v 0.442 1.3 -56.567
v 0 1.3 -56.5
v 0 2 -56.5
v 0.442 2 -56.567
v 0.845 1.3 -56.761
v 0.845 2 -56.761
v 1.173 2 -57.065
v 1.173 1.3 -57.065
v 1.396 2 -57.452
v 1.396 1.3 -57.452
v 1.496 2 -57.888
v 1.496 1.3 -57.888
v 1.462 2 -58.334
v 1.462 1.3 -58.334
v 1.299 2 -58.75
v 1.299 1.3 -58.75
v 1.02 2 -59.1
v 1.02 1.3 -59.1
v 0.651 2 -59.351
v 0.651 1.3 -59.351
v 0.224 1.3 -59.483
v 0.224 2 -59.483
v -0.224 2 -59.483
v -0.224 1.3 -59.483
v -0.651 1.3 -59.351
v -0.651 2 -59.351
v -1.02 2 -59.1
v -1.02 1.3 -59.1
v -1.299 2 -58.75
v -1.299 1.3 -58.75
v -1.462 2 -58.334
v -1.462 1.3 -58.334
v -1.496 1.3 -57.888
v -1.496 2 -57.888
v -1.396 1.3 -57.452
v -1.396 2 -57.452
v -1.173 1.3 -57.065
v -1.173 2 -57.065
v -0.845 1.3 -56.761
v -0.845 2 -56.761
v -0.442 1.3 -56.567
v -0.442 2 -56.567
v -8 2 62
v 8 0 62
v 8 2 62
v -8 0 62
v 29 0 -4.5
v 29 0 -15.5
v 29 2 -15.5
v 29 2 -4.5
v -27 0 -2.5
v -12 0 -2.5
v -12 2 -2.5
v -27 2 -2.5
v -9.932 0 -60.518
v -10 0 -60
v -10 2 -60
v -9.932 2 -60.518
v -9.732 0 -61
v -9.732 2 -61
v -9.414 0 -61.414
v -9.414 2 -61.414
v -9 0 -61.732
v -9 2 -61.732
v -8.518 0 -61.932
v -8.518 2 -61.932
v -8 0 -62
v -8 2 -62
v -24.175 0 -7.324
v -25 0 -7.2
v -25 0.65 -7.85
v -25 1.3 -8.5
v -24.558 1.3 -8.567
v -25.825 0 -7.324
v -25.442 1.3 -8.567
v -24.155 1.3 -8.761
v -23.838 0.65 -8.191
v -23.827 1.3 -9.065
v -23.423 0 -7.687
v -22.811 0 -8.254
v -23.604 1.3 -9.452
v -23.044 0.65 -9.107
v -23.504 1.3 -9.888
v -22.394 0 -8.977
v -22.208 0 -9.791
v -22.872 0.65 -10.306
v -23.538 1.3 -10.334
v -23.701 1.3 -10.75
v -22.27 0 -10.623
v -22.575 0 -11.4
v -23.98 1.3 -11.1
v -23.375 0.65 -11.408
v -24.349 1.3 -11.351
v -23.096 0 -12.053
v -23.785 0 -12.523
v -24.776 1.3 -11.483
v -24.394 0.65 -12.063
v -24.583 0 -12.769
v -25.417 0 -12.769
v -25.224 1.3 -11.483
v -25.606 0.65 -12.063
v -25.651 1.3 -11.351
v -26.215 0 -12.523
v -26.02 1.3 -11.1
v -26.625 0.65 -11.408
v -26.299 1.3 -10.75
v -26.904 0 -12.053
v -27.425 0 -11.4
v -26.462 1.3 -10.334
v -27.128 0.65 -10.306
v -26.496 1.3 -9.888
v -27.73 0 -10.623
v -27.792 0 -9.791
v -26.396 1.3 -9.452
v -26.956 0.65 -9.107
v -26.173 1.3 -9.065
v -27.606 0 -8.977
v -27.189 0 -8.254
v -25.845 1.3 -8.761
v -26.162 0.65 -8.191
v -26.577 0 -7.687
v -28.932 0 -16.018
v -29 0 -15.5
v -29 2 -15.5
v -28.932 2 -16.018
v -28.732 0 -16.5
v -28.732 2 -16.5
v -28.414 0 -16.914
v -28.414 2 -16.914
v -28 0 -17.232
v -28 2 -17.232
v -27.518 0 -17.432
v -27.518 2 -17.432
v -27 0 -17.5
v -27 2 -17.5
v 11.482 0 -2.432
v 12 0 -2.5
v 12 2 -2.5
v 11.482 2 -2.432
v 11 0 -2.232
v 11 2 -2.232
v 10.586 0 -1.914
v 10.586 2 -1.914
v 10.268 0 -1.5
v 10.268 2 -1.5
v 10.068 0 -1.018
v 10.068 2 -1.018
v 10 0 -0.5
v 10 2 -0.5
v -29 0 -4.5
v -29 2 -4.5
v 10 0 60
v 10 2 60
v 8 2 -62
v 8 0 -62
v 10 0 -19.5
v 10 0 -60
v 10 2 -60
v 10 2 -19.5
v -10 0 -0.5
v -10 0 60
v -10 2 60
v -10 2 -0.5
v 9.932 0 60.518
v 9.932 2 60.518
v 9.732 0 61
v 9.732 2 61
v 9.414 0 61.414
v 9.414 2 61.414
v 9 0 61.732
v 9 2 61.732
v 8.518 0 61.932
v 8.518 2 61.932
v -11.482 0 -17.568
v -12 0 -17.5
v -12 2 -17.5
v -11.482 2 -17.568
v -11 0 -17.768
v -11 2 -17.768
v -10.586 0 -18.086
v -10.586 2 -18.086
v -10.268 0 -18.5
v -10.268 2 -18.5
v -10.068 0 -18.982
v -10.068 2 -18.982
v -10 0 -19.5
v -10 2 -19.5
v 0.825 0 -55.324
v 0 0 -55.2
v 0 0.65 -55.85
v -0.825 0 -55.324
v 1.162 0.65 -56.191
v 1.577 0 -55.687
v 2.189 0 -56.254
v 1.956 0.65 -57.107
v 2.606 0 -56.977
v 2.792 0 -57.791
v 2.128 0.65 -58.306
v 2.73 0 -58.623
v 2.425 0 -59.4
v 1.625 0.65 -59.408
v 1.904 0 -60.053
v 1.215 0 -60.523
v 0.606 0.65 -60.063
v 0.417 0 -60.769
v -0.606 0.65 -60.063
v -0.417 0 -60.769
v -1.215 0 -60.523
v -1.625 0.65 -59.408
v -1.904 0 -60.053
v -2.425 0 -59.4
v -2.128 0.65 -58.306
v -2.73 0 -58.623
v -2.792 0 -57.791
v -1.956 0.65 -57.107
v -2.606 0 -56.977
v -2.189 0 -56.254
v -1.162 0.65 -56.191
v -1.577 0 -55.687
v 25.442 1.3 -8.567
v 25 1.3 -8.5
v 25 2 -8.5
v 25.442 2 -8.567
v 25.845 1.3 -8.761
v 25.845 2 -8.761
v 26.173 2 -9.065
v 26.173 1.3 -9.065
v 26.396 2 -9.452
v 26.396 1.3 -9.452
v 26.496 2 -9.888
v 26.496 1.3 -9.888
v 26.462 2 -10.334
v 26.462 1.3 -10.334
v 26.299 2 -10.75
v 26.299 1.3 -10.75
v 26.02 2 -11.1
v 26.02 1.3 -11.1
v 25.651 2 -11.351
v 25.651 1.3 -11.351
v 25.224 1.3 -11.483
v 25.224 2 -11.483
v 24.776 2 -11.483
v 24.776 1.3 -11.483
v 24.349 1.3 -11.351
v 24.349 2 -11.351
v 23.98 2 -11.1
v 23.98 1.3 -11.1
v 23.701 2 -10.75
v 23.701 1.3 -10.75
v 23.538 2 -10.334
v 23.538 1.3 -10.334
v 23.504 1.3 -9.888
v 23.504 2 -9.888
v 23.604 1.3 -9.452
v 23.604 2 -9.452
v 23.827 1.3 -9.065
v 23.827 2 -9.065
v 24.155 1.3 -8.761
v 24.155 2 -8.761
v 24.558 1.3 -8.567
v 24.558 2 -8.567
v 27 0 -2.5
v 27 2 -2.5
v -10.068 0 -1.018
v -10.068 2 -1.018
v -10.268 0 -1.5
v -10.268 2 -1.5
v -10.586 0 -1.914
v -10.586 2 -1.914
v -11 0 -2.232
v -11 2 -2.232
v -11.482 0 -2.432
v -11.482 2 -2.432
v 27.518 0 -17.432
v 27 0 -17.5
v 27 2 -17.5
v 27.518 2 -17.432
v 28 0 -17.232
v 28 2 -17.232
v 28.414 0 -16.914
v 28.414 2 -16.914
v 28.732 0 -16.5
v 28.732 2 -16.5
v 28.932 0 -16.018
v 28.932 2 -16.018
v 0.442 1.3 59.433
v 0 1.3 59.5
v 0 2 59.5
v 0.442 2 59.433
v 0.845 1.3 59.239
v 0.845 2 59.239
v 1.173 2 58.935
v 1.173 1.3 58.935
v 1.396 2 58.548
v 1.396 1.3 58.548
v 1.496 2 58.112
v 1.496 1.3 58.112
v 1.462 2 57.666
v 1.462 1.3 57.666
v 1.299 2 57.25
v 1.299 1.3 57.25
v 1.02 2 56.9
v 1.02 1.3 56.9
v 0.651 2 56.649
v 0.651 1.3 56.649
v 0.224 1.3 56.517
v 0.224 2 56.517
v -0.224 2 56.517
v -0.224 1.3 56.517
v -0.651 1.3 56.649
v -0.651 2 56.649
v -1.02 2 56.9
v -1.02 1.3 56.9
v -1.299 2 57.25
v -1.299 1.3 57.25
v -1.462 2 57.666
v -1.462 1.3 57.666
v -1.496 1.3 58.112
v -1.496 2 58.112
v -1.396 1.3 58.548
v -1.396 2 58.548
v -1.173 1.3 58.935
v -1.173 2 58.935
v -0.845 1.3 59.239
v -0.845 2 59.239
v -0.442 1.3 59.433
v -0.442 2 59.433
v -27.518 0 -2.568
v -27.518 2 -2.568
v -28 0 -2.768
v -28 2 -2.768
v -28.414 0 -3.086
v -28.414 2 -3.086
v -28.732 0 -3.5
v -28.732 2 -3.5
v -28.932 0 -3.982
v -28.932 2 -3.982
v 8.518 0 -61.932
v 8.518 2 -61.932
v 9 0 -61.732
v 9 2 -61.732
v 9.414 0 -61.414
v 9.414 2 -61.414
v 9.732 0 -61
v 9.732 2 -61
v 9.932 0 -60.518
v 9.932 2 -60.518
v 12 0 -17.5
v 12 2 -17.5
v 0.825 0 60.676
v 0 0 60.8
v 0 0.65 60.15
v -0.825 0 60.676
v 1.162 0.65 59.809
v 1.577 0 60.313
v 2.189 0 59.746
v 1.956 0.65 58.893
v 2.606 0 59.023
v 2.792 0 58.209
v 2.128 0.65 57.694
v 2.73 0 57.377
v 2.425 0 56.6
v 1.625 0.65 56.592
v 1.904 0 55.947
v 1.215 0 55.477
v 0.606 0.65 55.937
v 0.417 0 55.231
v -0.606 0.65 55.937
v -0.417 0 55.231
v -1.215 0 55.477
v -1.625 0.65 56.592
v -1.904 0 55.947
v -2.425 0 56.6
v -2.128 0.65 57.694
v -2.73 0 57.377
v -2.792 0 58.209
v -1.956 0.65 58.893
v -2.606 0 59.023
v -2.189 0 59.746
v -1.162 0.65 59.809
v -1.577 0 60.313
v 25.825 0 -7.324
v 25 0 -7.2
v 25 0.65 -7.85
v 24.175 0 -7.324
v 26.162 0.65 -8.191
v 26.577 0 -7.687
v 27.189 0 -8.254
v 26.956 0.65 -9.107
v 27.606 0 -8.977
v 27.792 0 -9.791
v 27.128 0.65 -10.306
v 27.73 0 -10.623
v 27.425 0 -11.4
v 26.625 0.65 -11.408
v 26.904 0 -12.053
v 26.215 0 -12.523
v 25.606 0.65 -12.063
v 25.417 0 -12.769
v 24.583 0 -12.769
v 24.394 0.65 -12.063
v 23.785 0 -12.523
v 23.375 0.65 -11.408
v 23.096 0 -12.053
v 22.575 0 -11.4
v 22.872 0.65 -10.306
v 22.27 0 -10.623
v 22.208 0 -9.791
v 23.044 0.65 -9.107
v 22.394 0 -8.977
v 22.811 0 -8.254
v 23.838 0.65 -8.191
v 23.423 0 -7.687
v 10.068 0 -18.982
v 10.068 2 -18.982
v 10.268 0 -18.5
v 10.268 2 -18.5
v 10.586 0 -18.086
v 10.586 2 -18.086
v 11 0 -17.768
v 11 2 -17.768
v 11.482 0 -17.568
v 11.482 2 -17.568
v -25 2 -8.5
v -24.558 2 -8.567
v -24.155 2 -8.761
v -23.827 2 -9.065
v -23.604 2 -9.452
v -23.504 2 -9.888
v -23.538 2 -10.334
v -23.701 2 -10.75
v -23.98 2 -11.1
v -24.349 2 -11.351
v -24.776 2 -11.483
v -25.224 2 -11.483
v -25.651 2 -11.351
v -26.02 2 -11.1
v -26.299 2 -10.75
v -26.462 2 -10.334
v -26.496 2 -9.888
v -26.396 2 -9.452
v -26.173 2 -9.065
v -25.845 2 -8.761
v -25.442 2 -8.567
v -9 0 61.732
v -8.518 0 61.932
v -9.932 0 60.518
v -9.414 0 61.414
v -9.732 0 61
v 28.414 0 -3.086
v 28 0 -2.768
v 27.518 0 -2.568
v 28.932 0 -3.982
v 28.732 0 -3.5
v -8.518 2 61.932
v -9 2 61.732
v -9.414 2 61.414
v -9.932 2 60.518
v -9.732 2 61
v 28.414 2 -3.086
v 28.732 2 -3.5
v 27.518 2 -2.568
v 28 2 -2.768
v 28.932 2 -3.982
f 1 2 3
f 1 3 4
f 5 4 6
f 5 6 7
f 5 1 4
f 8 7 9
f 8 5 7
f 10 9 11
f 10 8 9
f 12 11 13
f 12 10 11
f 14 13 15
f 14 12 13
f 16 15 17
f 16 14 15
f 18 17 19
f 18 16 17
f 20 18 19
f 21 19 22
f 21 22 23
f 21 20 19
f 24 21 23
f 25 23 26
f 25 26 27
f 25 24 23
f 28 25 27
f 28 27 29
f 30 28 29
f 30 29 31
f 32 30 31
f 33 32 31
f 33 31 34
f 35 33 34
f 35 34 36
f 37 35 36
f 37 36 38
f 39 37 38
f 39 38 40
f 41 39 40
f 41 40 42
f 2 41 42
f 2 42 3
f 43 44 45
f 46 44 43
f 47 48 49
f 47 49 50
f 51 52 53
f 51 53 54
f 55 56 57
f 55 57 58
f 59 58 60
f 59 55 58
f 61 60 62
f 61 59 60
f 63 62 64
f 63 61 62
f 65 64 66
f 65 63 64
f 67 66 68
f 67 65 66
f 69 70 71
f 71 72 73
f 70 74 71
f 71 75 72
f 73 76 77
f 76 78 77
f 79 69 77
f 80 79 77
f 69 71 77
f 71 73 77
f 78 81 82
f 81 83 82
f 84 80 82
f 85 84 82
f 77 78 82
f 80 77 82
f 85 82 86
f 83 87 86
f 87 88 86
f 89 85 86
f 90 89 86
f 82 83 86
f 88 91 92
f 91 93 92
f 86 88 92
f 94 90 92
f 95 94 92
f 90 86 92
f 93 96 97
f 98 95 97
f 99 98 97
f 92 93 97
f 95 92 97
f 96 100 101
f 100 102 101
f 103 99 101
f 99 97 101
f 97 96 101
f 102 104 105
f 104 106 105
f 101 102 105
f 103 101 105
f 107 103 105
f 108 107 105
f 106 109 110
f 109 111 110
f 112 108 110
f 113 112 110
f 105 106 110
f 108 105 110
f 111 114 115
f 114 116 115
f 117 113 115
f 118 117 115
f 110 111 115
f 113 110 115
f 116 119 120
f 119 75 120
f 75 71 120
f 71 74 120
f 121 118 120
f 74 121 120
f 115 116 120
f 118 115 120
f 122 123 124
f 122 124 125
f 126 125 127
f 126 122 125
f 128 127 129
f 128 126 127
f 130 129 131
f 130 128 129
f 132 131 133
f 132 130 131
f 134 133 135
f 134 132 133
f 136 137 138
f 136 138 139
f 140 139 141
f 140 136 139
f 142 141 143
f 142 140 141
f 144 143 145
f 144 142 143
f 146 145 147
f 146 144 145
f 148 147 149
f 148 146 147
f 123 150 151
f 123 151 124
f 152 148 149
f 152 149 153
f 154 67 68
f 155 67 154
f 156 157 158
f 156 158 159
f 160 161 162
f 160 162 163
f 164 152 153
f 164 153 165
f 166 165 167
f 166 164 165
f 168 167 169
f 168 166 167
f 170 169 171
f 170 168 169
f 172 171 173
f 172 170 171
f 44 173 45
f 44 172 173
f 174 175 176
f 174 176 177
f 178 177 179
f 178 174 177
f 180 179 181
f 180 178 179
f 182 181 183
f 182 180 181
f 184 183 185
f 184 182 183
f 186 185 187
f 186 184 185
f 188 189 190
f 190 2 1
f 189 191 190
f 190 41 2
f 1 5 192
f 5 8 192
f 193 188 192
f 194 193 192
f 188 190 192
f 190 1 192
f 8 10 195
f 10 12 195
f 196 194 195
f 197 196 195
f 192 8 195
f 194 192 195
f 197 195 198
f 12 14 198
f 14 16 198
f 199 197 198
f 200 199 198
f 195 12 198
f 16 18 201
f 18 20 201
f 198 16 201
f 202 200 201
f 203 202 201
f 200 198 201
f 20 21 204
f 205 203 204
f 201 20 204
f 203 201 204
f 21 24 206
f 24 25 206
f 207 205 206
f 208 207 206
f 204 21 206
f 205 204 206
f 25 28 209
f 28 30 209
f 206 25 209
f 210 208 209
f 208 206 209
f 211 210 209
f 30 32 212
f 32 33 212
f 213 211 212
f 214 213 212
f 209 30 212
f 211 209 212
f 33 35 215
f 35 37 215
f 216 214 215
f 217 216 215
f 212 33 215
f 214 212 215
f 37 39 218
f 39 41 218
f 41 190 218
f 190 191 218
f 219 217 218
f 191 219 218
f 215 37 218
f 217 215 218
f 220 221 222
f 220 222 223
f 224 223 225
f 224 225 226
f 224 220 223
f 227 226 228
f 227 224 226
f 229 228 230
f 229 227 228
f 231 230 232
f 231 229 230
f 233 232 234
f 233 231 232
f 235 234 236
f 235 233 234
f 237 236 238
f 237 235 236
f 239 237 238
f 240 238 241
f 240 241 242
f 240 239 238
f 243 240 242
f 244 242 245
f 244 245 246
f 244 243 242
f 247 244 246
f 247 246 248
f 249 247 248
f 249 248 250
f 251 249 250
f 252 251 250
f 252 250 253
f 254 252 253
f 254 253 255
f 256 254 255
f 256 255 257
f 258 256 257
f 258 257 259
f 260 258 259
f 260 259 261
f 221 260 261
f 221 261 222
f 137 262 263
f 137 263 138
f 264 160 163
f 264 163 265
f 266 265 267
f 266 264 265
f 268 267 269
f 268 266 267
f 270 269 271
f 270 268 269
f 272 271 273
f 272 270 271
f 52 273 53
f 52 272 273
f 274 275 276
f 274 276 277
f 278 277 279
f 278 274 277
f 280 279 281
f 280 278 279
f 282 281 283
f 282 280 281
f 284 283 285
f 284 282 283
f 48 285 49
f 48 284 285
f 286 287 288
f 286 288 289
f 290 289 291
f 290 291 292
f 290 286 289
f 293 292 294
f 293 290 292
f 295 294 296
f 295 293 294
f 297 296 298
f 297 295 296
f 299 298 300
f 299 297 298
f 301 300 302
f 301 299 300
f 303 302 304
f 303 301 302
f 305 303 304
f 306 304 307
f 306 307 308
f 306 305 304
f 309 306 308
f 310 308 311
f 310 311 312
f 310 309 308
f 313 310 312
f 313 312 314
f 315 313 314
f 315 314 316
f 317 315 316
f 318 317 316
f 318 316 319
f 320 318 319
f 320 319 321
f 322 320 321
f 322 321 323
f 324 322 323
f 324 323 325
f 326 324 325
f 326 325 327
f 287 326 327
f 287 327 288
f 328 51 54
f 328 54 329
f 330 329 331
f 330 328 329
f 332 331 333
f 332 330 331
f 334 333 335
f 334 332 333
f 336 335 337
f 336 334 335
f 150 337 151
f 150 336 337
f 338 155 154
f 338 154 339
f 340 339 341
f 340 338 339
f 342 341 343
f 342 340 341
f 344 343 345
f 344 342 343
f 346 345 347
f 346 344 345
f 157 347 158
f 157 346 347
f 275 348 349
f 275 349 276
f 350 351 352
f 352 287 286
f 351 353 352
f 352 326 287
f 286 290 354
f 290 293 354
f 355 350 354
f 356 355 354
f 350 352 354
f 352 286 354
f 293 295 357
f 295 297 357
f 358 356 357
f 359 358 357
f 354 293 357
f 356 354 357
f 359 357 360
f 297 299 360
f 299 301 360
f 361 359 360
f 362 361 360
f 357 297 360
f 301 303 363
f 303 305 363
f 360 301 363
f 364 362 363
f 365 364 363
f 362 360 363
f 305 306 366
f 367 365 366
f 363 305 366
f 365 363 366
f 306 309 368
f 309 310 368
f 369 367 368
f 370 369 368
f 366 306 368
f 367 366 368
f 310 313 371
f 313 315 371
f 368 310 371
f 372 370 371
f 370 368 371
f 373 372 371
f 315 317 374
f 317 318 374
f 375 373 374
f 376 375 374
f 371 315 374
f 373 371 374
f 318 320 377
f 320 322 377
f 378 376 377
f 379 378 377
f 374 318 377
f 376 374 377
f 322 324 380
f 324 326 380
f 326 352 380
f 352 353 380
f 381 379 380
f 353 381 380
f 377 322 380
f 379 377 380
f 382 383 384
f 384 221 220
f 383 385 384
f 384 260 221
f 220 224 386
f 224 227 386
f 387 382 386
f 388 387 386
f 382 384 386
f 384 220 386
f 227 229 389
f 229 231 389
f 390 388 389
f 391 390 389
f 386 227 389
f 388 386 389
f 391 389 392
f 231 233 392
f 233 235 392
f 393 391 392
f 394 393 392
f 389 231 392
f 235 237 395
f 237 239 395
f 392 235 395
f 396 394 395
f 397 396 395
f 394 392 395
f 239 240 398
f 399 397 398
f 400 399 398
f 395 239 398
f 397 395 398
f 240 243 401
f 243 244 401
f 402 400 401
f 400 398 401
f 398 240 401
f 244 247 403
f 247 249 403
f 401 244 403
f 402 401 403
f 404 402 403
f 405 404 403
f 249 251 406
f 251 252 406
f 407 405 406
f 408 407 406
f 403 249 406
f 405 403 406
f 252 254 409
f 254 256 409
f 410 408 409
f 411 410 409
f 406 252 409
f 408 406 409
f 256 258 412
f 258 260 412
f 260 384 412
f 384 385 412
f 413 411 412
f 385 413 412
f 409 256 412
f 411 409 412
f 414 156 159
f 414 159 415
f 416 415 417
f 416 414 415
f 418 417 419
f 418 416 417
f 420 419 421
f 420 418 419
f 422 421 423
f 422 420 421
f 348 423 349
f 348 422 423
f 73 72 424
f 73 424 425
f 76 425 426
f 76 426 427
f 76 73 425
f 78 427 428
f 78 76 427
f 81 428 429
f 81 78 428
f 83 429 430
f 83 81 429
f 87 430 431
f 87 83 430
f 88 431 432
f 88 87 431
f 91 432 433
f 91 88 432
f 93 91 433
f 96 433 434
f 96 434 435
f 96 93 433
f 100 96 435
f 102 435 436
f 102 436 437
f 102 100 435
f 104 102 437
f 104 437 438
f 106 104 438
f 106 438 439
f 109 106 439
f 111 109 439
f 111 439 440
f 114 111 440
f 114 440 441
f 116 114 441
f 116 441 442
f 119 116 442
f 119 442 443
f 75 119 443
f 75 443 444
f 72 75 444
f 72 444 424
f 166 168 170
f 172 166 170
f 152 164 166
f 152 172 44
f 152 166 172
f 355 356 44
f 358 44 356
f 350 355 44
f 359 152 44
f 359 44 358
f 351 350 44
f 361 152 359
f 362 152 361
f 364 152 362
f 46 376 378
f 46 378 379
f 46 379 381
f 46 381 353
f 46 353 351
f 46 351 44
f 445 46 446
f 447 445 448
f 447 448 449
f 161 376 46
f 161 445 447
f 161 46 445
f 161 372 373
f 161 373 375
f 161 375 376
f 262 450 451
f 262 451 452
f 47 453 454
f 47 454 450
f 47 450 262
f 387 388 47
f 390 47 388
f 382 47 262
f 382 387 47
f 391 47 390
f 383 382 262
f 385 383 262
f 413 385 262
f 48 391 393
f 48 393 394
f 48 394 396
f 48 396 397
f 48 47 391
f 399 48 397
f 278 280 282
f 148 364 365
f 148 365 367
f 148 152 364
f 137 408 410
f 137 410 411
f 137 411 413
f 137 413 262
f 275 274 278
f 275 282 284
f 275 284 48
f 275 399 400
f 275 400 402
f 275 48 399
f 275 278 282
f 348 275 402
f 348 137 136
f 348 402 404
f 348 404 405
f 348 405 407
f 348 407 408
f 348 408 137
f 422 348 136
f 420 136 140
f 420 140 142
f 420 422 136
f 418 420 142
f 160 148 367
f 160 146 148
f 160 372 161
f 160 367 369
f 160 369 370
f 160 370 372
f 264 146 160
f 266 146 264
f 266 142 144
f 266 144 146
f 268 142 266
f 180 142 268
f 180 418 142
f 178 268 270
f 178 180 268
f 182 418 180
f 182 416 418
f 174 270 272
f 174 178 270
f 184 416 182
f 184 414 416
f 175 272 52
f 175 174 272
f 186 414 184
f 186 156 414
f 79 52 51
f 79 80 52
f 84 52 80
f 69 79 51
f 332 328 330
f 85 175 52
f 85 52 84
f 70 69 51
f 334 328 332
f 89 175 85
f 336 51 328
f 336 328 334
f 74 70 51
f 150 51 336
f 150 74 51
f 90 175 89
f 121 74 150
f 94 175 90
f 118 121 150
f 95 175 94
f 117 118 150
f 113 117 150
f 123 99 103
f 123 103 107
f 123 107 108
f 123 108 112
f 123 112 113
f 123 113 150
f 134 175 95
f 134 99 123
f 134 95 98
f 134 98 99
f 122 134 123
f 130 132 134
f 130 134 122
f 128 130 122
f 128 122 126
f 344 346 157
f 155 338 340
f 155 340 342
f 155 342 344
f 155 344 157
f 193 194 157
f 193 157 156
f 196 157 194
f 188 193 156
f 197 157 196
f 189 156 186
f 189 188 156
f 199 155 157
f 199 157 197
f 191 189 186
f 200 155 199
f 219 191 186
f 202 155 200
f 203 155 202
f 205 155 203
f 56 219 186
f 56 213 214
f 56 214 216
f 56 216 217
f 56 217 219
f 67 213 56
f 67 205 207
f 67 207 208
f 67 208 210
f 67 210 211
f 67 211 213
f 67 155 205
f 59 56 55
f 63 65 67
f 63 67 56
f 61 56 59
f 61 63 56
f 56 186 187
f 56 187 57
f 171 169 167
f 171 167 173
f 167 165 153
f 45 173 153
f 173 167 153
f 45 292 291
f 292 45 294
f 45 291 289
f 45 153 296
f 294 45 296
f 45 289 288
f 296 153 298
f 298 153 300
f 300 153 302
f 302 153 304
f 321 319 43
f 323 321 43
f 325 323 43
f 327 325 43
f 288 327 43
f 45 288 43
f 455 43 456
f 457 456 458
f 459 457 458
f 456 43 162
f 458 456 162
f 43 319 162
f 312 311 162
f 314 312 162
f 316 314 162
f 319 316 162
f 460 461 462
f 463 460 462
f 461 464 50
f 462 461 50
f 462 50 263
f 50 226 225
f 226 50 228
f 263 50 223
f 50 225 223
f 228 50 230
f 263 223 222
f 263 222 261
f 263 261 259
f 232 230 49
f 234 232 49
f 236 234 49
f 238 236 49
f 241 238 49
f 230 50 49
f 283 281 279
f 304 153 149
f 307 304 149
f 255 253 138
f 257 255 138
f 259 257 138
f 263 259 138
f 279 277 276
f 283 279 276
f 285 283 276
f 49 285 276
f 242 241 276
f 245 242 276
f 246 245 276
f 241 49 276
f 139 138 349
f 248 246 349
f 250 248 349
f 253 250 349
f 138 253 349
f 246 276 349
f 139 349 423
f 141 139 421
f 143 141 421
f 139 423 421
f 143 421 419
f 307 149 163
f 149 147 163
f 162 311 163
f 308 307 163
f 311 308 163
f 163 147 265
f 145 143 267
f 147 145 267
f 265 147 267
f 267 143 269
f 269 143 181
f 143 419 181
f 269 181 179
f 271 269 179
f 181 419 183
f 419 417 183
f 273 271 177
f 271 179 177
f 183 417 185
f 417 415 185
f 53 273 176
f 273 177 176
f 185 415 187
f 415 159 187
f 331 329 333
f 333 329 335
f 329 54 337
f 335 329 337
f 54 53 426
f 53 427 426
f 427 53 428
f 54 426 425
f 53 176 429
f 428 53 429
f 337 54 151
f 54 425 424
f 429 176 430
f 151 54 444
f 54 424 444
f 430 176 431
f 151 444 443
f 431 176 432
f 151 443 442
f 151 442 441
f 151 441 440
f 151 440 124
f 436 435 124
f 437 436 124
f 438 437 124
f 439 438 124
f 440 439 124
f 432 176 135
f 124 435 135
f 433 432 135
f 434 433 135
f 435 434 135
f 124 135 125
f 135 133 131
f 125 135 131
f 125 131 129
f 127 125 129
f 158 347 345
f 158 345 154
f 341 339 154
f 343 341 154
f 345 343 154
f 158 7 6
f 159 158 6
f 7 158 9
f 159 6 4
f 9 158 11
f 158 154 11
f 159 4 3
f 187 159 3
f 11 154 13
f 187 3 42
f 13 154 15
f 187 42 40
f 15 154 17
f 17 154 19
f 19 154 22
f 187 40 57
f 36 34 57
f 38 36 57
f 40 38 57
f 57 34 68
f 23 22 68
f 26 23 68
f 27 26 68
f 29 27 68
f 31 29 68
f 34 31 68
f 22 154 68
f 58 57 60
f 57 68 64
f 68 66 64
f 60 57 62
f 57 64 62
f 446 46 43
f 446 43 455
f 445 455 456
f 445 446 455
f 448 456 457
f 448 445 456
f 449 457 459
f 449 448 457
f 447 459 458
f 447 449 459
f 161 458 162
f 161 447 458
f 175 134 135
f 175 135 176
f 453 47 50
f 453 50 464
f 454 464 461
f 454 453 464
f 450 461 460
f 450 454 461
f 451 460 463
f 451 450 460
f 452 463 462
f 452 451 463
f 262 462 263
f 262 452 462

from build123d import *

# Parameters (mm, degrees)
SKETCH1_R                     = 1.5
BOSS_EXTRUDE1_DEPTH           = 2
CSK_FOR_M3_SFHCS1_D           = 3
CSK_FOR_M3_SFHCS1_DEPTH       = 9.5
CSK_FOR_M3_SFHCS1_CSINK_D     = 5.6
CSK_FOR_M3_SFHCS1_CSINK_ANGLE = 90
CSK_FOR_M3_SFHCS1_TIP         = 0.901290929


with BuildPart() as part:
    # Sketch1 → Boss-Extrude1 (new body)
    with BuildSketch(Plane(origin=(0, 0, 0), x_dir=(1, 0, 0), z_dir=(0, 1, 0))):
        with BuildLine():
            Line((12, 17.5), (27, 17.5))
            ThreePointArc((27, 17.5), (28.414213562, 16.914213562), (29, 15.5))
            Line((29, 15.5), (29, 4.5))
            ThreePointArc((29, 4.5), (28.414213562, 3.085786438), (27, 2.5))
            Line((27, 2.5), (12, 2.5))
            ThreePointArc((12, 2.5), (10.585786438, 1.914213562), (10, 0.5))
            Line((10, 0.5), (10, -60))
            ThreePointArc((10, -60), (9.414213562, -61.414213562), (8, -62))
            Line((8, -62), (-8, -62))
            ThreePointArc((-8, -62), (-9.414213562, -61.414213562), (-10, -60))
            Line((-10, -60), (-10, 0.5))
            ThreePointArc((-10, 0.5), (-10.585786438, 1.914213562), (-12, 2.5))
            Line((-12, 2.5), (-27, 2.5))
            ThreePointArc((-27, 2.5), (-28.414213562, 3.085786438), (-29, 4.5))
            Line((-29, 4.5), (-29, 15.5))
            ThreePointArc((-29, 15.5), (-28.414213562, 16.914213562), (-27, 17.5))
            Line((-27, 17.5), (-12, 17.5))
            ThreePointArc((-12, 17.5), (-10.585786438, 18.085786438), (-10, 19.5))
            Line((-10, 19.5), (-10, 60))
            ThreePointArc((-10, 60), (-9.414213562, 61.414213562), (-8, 62))
            Line((-8, 62), (8, 62))
            ThreePointArc((8, 62), (9.414213562, 61.414213562), (10, 60))
            Line((10, 60), (10, 19.5))
            ThreePointArc((10, 19.5), (10.585786438, 18.085786438), (12, 17.5))
        make_face()
        with Locations(Location((0, 58, 0), (0, 0, 270))):
            Circle(SKETCH1_R, mode=Mode.SUBTRACT)
        with Locations(Location((0, -58, 0), (0, 0, 270))):
            Circle(SKETCH1_R, mode=Mode.SUBTRACT)
        with Locations(Location((25, 10, 0), (0, 0, 270))):
            Circle(SKETCH1_R, mode=Mode.SUBTRACT)
        with Locations(Location((-25, 10, 0), (0, 0, 270))):
            Circle(SKETCH1_R, mode=Mode.SUBTRACT)
    extrude(amount=BOSS_EXTRUDE1_DEPTH)

    # CSK for M3 SFHCS1
    with Locations(Plane(origin=(25, 0, -10), x_dir=(0, 0, -1), z_dir=(0, -1, 0))):
        with Locations((0, 0), (0, -50), (-68, -25), (48, -25)):
            CounterSinkHole(CSK_FOR_M3_SFHCS1_D / 2, CSK_FOR_M3_SFHCS1_CSINK_D / 2, depth=CSK_FOR_M3_SFHCS1_DEPTH, counter_sink_angle=CSK_FOR_M3_SFHCS1_CSINK_ANGLE)
            with Locations((0, 0, -(CSK_FOR_M3_SFHCS1_DEPTH + CSK_FOR_M3_SFHCS1_TIP / 2))):  # 118° drill point
                Cone(0, CSK_FOR_M3_SFHCS1_D / 2, CSK_FOR_M3_SFHCS1_TIP, mode=Mode.SUBTRACT)


solid = part.part
